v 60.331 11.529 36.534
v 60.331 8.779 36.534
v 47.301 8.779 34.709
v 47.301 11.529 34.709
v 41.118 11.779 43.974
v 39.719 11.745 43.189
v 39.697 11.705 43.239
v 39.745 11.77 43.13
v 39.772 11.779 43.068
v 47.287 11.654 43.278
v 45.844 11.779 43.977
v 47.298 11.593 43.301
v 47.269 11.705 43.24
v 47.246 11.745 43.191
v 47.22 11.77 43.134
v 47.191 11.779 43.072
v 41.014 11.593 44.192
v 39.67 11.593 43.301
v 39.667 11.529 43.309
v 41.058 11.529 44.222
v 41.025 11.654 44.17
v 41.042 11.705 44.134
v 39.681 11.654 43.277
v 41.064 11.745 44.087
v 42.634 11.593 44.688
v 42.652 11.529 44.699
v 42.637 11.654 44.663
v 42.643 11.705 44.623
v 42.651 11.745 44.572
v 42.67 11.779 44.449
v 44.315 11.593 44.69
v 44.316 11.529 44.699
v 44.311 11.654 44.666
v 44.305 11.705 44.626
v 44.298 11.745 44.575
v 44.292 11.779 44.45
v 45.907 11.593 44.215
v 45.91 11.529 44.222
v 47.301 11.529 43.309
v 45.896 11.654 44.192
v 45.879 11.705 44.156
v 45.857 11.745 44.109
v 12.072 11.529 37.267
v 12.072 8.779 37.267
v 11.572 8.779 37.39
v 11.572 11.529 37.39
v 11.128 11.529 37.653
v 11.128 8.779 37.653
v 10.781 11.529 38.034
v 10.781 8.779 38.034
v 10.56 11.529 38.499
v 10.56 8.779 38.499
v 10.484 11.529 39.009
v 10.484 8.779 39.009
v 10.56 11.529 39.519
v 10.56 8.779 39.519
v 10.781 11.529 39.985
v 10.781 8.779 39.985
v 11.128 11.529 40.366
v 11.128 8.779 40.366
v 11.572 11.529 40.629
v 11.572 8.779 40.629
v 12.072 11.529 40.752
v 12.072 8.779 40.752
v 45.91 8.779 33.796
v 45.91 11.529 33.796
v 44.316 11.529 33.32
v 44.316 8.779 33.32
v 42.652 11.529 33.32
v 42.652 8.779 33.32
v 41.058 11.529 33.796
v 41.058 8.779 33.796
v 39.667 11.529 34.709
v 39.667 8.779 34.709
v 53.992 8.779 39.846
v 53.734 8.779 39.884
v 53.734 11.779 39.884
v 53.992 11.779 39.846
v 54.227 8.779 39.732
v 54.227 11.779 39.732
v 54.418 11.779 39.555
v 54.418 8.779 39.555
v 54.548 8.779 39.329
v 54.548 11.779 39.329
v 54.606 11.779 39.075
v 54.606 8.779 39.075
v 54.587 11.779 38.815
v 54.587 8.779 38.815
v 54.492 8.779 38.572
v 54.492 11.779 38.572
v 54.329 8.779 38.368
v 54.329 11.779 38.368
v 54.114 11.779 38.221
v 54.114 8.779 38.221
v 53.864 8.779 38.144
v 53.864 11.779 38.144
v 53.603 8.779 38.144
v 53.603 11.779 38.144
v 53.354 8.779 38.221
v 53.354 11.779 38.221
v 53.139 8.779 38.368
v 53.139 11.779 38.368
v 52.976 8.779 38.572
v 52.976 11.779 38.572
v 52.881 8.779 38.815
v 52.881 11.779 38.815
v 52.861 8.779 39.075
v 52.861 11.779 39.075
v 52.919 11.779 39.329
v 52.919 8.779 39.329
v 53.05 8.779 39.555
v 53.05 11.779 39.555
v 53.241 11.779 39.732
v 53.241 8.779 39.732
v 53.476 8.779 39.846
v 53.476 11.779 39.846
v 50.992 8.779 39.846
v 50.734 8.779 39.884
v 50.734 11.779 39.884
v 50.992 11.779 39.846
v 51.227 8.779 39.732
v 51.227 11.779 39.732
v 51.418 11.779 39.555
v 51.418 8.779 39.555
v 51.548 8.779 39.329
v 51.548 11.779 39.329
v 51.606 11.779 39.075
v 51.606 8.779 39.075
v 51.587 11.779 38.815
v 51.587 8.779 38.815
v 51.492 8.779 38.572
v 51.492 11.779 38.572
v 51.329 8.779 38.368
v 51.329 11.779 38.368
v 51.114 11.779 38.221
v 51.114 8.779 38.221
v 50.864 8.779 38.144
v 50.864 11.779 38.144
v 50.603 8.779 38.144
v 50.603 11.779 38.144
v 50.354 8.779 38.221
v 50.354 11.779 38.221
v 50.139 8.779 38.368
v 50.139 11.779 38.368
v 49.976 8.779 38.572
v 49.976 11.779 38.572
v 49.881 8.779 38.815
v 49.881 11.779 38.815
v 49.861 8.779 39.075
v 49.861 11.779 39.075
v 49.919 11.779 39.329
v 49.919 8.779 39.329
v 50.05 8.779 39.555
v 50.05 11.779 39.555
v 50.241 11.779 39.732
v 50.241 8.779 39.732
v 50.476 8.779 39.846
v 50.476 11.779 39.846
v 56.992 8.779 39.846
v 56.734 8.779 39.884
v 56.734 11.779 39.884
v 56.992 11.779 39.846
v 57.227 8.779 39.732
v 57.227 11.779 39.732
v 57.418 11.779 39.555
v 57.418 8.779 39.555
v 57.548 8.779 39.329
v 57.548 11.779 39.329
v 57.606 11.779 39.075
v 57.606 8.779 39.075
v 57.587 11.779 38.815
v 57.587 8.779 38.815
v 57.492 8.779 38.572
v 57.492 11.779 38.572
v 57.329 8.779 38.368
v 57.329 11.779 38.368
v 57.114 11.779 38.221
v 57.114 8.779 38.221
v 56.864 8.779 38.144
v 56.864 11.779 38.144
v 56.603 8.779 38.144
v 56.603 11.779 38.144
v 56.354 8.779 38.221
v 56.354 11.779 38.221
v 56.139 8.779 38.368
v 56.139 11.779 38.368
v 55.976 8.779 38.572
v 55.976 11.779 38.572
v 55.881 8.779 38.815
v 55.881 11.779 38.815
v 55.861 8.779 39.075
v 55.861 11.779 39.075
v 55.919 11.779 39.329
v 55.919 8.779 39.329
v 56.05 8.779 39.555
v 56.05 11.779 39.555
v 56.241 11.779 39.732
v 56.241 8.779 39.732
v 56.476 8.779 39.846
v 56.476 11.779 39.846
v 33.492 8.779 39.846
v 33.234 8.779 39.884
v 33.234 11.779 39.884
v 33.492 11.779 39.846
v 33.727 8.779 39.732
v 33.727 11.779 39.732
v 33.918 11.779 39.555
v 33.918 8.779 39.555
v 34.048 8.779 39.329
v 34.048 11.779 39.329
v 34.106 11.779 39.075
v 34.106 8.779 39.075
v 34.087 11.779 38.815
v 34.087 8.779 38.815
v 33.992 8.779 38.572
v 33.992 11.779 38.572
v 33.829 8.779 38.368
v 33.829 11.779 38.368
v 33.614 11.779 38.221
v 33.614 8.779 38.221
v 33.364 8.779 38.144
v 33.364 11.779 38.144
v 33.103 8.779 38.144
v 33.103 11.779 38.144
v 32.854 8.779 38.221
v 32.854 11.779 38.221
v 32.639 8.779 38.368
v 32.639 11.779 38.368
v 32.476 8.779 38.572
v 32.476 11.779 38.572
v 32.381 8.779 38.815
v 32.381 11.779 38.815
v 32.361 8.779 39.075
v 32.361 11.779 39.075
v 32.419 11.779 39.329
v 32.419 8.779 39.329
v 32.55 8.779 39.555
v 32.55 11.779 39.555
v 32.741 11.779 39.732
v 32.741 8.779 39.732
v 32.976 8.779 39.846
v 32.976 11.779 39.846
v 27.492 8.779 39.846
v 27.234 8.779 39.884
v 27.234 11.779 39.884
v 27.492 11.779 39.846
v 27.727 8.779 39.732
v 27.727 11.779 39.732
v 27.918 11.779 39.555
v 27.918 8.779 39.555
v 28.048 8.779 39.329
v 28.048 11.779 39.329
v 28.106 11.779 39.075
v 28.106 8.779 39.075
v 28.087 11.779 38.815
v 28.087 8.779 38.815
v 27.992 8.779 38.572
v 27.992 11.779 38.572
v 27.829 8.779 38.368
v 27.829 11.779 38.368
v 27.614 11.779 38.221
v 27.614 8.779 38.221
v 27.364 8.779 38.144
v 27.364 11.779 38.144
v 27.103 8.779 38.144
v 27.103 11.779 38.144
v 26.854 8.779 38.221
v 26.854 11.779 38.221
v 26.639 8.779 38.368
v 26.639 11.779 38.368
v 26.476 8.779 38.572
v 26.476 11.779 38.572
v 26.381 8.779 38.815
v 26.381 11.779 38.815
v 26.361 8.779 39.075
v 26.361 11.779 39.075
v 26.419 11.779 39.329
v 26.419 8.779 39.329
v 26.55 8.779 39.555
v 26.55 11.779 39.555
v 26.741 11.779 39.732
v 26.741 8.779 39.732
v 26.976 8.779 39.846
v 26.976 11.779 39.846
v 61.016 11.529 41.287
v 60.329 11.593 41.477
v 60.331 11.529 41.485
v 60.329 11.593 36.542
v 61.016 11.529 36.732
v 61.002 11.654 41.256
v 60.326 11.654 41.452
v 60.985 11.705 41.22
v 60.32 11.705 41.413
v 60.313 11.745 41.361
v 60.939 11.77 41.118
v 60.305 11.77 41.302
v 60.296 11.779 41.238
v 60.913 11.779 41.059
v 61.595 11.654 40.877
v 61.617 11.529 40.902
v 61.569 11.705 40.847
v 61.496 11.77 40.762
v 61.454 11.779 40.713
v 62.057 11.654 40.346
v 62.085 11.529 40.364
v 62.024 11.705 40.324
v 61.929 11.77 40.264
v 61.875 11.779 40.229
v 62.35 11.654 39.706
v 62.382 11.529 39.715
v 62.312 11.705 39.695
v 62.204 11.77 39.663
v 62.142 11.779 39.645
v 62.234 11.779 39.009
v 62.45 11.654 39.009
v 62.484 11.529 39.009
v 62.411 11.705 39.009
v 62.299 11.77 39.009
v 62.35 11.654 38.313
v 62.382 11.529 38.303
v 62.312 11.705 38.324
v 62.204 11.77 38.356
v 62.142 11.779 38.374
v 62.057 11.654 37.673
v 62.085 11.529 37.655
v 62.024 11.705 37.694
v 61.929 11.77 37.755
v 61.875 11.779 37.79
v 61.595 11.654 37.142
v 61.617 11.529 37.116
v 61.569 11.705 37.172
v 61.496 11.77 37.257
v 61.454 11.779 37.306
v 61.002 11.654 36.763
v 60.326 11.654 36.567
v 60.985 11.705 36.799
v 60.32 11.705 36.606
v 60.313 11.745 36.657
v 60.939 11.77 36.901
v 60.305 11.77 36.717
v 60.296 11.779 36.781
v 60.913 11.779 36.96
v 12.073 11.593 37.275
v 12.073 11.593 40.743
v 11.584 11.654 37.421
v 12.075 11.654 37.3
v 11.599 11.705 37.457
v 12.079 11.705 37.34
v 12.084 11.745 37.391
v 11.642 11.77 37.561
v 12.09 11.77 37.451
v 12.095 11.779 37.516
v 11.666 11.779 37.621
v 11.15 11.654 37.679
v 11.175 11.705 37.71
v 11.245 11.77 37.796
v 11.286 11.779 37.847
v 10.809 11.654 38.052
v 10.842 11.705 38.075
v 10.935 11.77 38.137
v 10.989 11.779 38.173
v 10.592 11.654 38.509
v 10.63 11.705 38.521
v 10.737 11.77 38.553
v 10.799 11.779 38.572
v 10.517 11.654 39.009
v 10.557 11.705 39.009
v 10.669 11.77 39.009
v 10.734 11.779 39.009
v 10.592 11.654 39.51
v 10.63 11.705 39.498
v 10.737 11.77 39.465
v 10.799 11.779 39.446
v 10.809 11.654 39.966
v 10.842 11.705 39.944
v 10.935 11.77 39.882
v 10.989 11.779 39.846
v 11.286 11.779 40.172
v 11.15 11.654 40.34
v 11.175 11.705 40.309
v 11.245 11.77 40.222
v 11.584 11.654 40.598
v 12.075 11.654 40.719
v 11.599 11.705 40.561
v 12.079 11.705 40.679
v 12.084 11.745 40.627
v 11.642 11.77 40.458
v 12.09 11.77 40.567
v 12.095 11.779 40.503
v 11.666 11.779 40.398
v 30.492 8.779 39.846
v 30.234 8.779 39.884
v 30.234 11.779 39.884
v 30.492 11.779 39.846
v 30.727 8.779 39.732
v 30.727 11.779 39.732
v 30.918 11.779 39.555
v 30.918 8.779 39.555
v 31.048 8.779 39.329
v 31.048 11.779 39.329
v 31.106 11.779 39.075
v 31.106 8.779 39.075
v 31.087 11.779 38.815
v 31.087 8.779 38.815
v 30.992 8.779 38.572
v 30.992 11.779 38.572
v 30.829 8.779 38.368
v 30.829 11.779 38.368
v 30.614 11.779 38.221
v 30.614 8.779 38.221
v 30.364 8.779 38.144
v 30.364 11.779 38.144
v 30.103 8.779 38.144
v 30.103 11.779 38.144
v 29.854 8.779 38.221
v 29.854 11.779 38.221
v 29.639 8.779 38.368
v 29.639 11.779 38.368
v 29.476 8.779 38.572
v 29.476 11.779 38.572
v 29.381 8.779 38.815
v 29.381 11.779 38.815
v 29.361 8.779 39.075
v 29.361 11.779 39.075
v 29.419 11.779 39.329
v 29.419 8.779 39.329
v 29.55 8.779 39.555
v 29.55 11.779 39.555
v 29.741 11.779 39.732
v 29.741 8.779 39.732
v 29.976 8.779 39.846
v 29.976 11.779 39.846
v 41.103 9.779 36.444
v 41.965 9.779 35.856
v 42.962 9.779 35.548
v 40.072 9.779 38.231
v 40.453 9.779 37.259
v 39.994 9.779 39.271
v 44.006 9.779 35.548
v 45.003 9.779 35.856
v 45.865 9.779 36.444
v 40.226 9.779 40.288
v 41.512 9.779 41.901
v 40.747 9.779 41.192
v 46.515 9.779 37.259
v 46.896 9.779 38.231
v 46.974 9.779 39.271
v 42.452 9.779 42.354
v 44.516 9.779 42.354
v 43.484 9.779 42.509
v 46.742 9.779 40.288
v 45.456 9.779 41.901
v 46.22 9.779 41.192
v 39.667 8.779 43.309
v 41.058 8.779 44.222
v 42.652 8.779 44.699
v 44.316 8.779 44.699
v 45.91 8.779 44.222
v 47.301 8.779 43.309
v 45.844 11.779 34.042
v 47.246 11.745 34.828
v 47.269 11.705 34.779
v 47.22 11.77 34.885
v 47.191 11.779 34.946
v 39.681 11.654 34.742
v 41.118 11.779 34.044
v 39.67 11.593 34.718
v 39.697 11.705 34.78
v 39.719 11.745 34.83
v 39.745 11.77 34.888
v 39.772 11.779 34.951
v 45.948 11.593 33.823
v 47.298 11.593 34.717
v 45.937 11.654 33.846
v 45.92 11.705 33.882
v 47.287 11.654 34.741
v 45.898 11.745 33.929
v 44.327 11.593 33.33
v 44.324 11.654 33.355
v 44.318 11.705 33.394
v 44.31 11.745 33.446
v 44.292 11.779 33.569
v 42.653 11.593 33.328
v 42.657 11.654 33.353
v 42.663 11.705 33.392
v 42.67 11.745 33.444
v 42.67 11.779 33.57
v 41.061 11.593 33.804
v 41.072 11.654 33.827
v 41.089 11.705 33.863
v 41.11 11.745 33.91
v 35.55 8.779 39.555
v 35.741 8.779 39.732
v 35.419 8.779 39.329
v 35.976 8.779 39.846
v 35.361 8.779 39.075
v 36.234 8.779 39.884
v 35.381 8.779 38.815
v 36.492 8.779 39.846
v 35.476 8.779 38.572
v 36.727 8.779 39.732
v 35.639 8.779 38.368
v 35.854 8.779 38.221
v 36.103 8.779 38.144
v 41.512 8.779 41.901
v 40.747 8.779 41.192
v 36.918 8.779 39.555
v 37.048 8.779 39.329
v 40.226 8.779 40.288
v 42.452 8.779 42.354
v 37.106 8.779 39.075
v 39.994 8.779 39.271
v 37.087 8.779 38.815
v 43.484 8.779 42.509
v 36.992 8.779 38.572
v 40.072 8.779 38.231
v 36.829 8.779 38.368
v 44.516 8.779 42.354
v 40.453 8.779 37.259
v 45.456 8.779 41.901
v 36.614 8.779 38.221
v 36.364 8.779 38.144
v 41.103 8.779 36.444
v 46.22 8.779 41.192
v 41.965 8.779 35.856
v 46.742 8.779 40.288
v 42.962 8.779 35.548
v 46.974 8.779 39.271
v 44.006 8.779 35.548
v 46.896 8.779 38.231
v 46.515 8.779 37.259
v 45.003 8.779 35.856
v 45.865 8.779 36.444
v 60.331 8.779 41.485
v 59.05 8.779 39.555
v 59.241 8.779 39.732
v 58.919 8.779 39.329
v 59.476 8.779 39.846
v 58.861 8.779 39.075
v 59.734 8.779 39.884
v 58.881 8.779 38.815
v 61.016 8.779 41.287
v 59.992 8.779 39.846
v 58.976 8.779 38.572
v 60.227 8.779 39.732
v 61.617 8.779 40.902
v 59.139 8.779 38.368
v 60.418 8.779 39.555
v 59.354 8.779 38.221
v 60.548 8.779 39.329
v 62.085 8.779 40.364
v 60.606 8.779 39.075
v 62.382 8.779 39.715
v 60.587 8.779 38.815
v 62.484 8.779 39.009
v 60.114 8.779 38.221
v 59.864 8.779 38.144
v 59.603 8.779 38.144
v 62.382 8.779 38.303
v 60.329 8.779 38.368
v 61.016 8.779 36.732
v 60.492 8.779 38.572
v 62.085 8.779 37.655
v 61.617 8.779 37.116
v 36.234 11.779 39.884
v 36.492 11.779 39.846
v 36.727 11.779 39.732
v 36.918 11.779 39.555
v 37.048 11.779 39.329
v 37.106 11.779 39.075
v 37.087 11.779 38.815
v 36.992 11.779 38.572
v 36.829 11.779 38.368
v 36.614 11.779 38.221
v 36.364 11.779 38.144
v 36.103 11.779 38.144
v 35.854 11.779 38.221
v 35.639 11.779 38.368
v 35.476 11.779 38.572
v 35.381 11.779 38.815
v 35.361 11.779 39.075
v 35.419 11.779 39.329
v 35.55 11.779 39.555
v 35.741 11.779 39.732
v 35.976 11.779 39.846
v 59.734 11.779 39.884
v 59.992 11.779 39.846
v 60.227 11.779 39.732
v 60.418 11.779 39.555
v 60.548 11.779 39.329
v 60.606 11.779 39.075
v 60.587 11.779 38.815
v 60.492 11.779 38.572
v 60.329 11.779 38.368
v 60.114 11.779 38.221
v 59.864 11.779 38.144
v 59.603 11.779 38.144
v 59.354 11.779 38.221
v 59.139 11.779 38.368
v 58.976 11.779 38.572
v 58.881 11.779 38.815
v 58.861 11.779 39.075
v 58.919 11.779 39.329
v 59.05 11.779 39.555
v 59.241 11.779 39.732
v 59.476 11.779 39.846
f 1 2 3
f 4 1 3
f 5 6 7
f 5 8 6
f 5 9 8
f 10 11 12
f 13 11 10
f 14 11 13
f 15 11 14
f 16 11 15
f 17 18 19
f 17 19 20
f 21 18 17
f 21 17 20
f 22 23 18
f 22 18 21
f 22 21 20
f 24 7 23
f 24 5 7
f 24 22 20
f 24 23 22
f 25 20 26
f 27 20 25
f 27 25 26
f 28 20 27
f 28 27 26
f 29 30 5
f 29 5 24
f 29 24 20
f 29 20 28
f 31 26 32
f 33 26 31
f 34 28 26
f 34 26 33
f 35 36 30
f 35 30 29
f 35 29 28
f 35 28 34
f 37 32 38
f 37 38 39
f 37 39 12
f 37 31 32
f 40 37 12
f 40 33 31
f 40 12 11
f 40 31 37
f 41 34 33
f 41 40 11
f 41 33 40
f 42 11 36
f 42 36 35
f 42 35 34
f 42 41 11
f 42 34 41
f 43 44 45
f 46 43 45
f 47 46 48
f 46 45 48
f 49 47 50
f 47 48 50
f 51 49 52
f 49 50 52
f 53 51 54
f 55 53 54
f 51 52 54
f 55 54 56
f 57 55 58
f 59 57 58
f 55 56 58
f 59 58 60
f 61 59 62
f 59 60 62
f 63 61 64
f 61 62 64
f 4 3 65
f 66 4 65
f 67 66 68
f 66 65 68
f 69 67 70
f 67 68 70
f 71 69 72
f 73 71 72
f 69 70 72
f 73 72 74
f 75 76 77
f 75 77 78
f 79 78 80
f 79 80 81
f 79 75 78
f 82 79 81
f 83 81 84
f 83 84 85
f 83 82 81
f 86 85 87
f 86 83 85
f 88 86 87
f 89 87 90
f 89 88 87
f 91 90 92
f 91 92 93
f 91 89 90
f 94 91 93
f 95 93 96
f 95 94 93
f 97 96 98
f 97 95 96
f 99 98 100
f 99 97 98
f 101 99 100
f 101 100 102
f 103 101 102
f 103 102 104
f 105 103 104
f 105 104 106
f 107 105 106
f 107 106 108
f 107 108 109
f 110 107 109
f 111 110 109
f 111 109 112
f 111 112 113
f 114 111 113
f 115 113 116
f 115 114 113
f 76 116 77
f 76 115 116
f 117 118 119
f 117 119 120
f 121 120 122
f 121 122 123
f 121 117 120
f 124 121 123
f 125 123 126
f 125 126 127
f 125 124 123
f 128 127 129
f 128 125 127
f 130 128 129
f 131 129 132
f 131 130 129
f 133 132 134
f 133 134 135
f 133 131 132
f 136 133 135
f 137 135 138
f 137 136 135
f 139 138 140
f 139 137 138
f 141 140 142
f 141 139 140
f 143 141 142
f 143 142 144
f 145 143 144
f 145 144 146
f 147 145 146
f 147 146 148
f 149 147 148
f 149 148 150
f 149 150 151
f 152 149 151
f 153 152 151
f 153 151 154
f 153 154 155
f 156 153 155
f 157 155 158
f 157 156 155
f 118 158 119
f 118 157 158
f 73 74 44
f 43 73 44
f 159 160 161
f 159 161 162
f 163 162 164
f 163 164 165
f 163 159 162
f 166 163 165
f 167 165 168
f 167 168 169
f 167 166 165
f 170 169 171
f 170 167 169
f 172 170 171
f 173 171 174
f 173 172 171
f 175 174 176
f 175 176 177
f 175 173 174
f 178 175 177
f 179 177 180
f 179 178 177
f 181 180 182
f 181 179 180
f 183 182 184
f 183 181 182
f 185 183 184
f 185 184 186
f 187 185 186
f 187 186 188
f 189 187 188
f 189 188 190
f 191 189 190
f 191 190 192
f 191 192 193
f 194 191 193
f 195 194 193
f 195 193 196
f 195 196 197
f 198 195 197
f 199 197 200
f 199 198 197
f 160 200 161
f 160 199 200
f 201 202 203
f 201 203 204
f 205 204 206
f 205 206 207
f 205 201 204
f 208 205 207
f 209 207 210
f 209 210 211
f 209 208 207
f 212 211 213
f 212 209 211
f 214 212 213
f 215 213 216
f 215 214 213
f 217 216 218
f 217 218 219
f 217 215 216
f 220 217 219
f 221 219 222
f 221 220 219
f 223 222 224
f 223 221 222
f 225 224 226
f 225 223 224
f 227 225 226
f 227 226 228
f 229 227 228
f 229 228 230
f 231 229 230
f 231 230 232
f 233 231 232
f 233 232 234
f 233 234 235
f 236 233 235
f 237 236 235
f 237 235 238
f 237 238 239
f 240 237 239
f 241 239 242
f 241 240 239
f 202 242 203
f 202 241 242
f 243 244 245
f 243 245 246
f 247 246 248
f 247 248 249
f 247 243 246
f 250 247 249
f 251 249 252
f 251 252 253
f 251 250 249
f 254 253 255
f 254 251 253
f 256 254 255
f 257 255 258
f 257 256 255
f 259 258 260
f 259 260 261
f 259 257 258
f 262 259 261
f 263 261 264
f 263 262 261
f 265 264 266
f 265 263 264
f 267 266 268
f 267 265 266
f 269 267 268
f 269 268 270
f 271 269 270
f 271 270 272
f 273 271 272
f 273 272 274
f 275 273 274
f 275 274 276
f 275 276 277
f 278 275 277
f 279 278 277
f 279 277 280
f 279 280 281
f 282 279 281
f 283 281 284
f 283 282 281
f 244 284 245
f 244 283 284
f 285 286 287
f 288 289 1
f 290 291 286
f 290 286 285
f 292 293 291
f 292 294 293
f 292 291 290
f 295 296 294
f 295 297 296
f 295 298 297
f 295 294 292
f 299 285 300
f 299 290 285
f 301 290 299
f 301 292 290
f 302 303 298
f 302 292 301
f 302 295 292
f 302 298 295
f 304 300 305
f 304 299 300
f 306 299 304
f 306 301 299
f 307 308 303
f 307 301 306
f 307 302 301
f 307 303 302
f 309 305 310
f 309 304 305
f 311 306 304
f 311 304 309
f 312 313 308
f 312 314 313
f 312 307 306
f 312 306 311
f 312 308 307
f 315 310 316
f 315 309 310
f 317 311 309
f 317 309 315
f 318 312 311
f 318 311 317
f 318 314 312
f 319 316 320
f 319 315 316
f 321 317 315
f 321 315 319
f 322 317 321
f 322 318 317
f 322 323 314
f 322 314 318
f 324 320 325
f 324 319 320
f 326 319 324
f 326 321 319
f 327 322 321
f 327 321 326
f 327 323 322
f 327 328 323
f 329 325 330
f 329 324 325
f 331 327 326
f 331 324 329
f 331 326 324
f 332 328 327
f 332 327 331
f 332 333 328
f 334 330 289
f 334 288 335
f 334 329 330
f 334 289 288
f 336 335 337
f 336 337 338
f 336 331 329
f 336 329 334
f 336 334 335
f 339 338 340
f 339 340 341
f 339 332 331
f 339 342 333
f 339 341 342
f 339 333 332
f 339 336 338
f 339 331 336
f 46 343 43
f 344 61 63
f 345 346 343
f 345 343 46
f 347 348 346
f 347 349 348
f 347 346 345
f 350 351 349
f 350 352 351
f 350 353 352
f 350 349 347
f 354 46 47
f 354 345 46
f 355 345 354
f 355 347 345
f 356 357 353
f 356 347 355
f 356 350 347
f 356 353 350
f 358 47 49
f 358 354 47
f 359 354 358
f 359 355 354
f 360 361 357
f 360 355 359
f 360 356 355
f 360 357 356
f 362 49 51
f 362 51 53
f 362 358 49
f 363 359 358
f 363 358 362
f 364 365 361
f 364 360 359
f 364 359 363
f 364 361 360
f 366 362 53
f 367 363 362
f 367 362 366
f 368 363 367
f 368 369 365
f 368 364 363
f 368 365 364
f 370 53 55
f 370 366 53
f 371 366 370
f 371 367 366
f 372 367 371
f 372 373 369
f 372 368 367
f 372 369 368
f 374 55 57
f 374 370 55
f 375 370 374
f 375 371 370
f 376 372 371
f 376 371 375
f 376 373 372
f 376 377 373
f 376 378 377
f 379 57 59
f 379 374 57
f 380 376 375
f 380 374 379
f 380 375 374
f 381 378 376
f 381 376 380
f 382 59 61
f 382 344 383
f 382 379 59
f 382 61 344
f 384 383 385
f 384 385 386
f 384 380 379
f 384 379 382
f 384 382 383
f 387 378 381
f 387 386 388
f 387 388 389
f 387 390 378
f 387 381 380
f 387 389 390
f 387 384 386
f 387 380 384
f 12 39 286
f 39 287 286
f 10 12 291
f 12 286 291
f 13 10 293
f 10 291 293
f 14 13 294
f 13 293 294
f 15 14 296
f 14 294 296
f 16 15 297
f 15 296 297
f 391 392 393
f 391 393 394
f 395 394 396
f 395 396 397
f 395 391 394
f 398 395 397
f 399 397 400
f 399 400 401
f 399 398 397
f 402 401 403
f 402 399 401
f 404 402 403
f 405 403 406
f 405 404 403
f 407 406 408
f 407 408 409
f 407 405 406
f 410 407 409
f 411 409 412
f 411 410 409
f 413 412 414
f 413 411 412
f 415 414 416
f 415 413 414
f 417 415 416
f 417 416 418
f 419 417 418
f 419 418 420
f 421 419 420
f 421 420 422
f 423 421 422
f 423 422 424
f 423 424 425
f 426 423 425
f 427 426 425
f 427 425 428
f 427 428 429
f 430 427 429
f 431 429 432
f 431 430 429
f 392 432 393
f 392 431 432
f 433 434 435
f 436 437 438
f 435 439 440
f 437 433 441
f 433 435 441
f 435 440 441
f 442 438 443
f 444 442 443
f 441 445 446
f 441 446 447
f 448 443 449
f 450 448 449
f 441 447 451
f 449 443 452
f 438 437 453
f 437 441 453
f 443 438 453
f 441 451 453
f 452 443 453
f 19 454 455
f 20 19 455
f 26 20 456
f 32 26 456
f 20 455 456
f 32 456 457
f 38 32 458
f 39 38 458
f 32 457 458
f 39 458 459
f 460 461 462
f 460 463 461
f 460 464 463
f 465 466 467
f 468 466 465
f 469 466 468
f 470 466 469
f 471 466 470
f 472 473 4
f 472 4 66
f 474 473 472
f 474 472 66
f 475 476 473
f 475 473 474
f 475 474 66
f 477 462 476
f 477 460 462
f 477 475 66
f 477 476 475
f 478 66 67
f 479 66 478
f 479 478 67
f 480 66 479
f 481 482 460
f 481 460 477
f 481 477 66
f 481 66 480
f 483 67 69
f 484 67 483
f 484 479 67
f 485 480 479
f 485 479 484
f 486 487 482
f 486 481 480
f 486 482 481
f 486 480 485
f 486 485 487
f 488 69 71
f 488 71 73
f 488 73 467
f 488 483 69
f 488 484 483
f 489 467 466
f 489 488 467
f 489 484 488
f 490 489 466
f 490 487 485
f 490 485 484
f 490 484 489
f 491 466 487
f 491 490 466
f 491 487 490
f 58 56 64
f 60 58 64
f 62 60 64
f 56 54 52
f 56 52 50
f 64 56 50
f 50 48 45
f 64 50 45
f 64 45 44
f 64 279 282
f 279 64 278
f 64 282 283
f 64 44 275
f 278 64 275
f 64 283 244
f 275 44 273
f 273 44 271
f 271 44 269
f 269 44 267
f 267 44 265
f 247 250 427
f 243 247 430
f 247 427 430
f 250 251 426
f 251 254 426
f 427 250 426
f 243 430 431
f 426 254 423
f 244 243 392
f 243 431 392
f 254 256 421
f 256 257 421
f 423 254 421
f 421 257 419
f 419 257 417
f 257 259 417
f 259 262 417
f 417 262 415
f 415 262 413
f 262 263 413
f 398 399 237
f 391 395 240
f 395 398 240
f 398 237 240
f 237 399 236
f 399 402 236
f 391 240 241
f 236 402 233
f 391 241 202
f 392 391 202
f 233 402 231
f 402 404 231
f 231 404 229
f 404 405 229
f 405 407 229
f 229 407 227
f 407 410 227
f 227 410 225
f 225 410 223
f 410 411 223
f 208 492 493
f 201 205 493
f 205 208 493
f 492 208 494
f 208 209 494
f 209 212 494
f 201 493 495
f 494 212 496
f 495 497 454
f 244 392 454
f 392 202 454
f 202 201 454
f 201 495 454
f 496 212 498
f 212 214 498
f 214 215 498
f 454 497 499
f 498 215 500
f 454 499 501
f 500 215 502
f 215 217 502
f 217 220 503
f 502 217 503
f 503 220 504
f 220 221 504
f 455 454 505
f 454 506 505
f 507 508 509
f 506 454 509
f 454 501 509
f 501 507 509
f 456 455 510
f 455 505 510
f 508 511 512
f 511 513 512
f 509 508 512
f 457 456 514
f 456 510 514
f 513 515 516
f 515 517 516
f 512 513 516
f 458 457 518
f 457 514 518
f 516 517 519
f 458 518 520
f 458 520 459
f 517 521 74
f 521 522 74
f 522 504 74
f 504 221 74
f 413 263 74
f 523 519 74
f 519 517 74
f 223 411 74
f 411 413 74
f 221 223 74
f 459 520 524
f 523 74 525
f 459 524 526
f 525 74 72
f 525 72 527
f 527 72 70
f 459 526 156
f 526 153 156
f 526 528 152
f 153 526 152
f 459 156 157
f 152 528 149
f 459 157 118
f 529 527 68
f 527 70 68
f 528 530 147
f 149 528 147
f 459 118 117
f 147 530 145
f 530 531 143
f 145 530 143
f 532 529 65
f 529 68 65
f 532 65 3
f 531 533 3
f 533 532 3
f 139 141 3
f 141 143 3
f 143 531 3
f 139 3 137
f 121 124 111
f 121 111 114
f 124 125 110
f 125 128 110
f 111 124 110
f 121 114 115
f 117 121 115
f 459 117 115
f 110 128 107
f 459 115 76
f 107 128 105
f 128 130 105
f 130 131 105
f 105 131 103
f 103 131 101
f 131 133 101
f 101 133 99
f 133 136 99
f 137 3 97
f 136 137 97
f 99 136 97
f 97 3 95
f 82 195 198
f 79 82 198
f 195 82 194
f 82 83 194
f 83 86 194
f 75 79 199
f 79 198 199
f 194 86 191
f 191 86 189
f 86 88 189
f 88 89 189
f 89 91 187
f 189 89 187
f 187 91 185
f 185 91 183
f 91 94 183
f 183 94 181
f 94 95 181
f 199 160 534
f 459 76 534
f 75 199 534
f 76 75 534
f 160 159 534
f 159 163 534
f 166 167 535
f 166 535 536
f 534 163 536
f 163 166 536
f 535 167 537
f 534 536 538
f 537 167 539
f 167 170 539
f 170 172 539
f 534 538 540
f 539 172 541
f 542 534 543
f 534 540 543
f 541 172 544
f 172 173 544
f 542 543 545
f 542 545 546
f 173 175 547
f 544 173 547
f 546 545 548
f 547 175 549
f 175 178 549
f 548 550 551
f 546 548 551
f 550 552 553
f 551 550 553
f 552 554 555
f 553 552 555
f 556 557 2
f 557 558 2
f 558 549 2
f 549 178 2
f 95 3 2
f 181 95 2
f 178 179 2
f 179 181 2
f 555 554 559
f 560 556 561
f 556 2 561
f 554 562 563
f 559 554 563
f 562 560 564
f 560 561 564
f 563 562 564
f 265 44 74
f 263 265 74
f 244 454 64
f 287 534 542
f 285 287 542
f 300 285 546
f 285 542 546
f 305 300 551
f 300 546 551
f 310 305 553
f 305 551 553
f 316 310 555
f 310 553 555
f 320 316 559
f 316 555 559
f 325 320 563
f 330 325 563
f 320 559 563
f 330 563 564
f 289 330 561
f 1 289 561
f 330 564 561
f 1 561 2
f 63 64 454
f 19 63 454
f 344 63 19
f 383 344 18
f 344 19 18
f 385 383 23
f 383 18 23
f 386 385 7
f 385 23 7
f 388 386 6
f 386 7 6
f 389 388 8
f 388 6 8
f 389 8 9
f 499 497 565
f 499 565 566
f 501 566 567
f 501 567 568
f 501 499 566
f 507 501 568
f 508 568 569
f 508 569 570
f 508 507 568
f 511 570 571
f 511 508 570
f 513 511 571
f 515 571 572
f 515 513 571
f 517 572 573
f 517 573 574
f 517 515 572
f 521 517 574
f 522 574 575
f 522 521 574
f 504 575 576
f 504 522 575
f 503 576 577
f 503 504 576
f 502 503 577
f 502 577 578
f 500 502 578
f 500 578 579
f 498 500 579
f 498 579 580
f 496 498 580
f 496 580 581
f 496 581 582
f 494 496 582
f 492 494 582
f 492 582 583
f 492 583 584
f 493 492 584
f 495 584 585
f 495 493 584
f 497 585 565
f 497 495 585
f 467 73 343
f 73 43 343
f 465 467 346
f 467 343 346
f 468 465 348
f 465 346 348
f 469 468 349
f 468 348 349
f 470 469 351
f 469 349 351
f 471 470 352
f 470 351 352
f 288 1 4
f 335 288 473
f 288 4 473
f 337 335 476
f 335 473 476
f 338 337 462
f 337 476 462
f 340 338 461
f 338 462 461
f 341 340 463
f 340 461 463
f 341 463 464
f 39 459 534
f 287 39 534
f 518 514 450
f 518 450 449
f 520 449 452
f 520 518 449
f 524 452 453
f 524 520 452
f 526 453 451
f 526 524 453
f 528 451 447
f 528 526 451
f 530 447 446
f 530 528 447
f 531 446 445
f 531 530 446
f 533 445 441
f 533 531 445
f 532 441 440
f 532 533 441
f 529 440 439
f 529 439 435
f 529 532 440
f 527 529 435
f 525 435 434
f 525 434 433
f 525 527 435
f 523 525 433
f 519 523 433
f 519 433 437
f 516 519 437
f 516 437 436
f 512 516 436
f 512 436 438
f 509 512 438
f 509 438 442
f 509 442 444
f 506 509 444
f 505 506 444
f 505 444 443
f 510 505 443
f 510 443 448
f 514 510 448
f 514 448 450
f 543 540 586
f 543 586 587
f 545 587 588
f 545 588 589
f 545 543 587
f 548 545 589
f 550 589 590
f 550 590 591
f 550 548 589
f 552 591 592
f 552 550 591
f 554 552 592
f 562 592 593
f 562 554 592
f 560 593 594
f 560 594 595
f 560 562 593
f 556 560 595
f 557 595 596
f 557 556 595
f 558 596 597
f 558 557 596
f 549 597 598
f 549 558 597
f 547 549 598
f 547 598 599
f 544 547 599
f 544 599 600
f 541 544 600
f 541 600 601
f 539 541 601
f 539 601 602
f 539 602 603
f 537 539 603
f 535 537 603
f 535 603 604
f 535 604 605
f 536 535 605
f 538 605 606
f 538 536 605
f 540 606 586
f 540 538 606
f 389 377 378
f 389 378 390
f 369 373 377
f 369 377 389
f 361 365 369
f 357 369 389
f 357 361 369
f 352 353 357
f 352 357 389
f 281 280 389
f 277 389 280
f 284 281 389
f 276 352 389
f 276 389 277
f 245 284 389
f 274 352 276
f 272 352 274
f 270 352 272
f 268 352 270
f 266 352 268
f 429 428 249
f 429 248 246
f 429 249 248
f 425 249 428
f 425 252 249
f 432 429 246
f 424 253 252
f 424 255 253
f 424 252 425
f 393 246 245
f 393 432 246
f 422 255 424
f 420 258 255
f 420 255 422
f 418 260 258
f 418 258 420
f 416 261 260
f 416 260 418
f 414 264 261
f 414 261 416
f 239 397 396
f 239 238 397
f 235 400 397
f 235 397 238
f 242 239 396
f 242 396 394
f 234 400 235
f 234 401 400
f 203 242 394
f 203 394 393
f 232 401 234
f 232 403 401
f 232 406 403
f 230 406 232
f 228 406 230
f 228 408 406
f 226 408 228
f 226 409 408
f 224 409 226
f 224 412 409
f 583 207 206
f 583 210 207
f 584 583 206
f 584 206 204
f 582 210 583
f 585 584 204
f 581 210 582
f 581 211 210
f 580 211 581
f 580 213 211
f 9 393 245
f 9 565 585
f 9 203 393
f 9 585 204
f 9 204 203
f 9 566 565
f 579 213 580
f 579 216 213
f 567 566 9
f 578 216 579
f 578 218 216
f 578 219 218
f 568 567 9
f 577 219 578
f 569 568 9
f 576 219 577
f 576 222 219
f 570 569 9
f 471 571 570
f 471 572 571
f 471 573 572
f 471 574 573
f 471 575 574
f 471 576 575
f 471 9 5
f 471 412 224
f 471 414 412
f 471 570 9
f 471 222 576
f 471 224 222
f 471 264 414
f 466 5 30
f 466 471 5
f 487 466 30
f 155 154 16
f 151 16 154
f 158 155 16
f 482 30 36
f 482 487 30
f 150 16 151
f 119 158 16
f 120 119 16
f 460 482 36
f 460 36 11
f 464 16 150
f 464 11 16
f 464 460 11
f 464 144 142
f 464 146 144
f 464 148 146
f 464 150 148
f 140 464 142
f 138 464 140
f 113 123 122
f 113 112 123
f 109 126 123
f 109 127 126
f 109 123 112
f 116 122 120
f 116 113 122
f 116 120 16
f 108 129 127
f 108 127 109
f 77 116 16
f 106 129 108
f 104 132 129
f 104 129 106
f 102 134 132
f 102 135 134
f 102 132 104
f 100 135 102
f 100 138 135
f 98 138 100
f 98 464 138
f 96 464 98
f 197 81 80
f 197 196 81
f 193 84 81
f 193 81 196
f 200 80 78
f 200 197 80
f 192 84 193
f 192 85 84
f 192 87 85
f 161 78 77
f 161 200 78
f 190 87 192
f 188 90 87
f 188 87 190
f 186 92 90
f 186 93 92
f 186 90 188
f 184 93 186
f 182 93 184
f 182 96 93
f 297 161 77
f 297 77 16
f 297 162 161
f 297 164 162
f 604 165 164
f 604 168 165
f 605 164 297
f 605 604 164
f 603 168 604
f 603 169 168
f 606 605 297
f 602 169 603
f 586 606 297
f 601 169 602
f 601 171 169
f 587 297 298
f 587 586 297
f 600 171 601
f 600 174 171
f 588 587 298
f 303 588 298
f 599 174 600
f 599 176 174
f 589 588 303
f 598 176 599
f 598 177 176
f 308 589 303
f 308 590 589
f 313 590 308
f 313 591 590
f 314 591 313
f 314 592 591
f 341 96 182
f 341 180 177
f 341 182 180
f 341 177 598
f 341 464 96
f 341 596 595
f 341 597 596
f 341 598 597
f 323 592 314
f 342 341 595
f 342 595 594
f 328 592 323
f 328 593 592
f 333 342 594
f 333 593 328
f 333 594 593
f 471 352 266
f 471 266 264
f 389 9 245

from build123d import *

# Parameters (mm, degrees)
SKETCH1_R           = 0.875
SKETCH1_R_2         = 3.5
BOSS_EXTRUDE1_DEPTH = 3
BOSS_EXTRUDE2_START = -2
SKETCH2_R           = 3.5
BOSS_EXTRUDE2_DEPTH = 2
FILLET1_R           = 0.25


with BuildPart() as part:
    # Sketch1 → Boss-Extrude1 (new body)
    with BuildSketch(Plane(origin=(0, 8.778505218, 0), x_dir=(1, 0, 0), z_dir=(0, 1, 0))):
        with BuildLine():
            Line((39.666515042, -34.709383283), (12.072408659, -37.266851361))
            ThreePointArc((12.072408659, -37.266851361), (10.483909442, -39.009383283), (12.072408659, -40.751915204))
            Line((12.072408659, -40.751915204), (39.666515042, -43.309383283))
            ThreePointArc((39.666515042, -43.309383283), (43.483909442, -44.759383283), (47.301303841, -43.309383283))
            Line((47.301303841, -43.309383283), (60.330539136, -41.485236238))
            ThreePointArc((60.330539136, -41.485236238), (62.483909442, -39.009383283), (60.330539136, -36.533530328))
            Line((60.330539136, -36.533530328), (47.301303841, -34.709383283))
            ThreePointArc((47.301303841, -34.709383283), (43.483909442, -33.259383283), (39.666515042, -34.709383283))
        make_face()
        with Locations(Location((27.233909442, -39.009383283, 0), (0, 0, 270))):
            Circle(SKETCH1_R, mode=Mode.SUBTRACT)
        with Locations(Location((30.233909442, -39.009383283, 0), (0, 0, 270))):
            Circle(SKETCH1_R, mode=Mode.SUBTRACT)
        with Locations(Location((33.233909442, -39.009383283, 0), (0, 0, 270))):
            Circle(SKETCH1_R, mode=Mode.SUBTRACT)
        with Locations(Location((36.233909442, -39.009383283, 0), (0, 0, 270))):
            Circle(SKETCH1_R, mode=Mode.SUBTRACT)
        with Locations(Location((43.483909442, -39.009383283, 0), (0, 0, 270))):
            Circle(SKETCH1_R_2, mode=Mode.SUBTRACT)
        with Locations(Location((50.733909442, -39.009383283, 0), (0, 0, 270))):
            Circle(SKETCH1_R, mode=Mode.SUBTRACT)
        with Locations(Location((53.733909442, -39.009383283, 0), (0, 0, 270))):
            Circle(SKETCH1_R, mode=Mode.SUBTRACT)
        with Locations(Location((56.733909442, -39.009383283, 0), (0, 0, 270))):
            Circle(SKETCH1_R, mode=Mode.SUBTRACT)
        with Locations(Location((59.733909442, -39.009383283, 0), (0, 0, 270))):
            Circle(SKETCH1_R, mode=Mode.SUBTRACT)
    extrude(amount=BOSS_EXTRUDE1_DEPTH)

    # Sketch2 → Boss-Extrude2 (add)
    with BuildSketch(Plane(origin=(0, 11.778505218, 0), x_dir=(1, 0, 0), z_dir=(0, 1, 0)).offset(BOSS_EXTRUDE2_START)):
        with Locations(Location((43.483909442, -39.009383283, 0), (0, 0, 270))):
            Circle(SKETCH2_R)
    extrude(amount=BOSS_EXTRUDE2_DEPTH)

    # Fillet1
    fillet1_edges = [part.edges().sort_by_distance(p)[0] for p in [
        (25.869461851, 11.778505218, 42.030649244),
        (43.483909442, 11.778505218, 44.759383283),
        (53.815921489, 11.778505218, 42.39730976),
        (62.483909442, 11.778505218, 39.009383283),
        (53.815921489, 11.778505218, 35.621456805),
        (43.483909442, 11.778505218, 33.259383283),
        (25.869461851, 11.778505218, 35.988117322),
        (10.483909442, 11.778505218, 39.009383283),
    ]]
    fillet(fillet1_edges, radius=FILLET1_R)


solid = part.part
